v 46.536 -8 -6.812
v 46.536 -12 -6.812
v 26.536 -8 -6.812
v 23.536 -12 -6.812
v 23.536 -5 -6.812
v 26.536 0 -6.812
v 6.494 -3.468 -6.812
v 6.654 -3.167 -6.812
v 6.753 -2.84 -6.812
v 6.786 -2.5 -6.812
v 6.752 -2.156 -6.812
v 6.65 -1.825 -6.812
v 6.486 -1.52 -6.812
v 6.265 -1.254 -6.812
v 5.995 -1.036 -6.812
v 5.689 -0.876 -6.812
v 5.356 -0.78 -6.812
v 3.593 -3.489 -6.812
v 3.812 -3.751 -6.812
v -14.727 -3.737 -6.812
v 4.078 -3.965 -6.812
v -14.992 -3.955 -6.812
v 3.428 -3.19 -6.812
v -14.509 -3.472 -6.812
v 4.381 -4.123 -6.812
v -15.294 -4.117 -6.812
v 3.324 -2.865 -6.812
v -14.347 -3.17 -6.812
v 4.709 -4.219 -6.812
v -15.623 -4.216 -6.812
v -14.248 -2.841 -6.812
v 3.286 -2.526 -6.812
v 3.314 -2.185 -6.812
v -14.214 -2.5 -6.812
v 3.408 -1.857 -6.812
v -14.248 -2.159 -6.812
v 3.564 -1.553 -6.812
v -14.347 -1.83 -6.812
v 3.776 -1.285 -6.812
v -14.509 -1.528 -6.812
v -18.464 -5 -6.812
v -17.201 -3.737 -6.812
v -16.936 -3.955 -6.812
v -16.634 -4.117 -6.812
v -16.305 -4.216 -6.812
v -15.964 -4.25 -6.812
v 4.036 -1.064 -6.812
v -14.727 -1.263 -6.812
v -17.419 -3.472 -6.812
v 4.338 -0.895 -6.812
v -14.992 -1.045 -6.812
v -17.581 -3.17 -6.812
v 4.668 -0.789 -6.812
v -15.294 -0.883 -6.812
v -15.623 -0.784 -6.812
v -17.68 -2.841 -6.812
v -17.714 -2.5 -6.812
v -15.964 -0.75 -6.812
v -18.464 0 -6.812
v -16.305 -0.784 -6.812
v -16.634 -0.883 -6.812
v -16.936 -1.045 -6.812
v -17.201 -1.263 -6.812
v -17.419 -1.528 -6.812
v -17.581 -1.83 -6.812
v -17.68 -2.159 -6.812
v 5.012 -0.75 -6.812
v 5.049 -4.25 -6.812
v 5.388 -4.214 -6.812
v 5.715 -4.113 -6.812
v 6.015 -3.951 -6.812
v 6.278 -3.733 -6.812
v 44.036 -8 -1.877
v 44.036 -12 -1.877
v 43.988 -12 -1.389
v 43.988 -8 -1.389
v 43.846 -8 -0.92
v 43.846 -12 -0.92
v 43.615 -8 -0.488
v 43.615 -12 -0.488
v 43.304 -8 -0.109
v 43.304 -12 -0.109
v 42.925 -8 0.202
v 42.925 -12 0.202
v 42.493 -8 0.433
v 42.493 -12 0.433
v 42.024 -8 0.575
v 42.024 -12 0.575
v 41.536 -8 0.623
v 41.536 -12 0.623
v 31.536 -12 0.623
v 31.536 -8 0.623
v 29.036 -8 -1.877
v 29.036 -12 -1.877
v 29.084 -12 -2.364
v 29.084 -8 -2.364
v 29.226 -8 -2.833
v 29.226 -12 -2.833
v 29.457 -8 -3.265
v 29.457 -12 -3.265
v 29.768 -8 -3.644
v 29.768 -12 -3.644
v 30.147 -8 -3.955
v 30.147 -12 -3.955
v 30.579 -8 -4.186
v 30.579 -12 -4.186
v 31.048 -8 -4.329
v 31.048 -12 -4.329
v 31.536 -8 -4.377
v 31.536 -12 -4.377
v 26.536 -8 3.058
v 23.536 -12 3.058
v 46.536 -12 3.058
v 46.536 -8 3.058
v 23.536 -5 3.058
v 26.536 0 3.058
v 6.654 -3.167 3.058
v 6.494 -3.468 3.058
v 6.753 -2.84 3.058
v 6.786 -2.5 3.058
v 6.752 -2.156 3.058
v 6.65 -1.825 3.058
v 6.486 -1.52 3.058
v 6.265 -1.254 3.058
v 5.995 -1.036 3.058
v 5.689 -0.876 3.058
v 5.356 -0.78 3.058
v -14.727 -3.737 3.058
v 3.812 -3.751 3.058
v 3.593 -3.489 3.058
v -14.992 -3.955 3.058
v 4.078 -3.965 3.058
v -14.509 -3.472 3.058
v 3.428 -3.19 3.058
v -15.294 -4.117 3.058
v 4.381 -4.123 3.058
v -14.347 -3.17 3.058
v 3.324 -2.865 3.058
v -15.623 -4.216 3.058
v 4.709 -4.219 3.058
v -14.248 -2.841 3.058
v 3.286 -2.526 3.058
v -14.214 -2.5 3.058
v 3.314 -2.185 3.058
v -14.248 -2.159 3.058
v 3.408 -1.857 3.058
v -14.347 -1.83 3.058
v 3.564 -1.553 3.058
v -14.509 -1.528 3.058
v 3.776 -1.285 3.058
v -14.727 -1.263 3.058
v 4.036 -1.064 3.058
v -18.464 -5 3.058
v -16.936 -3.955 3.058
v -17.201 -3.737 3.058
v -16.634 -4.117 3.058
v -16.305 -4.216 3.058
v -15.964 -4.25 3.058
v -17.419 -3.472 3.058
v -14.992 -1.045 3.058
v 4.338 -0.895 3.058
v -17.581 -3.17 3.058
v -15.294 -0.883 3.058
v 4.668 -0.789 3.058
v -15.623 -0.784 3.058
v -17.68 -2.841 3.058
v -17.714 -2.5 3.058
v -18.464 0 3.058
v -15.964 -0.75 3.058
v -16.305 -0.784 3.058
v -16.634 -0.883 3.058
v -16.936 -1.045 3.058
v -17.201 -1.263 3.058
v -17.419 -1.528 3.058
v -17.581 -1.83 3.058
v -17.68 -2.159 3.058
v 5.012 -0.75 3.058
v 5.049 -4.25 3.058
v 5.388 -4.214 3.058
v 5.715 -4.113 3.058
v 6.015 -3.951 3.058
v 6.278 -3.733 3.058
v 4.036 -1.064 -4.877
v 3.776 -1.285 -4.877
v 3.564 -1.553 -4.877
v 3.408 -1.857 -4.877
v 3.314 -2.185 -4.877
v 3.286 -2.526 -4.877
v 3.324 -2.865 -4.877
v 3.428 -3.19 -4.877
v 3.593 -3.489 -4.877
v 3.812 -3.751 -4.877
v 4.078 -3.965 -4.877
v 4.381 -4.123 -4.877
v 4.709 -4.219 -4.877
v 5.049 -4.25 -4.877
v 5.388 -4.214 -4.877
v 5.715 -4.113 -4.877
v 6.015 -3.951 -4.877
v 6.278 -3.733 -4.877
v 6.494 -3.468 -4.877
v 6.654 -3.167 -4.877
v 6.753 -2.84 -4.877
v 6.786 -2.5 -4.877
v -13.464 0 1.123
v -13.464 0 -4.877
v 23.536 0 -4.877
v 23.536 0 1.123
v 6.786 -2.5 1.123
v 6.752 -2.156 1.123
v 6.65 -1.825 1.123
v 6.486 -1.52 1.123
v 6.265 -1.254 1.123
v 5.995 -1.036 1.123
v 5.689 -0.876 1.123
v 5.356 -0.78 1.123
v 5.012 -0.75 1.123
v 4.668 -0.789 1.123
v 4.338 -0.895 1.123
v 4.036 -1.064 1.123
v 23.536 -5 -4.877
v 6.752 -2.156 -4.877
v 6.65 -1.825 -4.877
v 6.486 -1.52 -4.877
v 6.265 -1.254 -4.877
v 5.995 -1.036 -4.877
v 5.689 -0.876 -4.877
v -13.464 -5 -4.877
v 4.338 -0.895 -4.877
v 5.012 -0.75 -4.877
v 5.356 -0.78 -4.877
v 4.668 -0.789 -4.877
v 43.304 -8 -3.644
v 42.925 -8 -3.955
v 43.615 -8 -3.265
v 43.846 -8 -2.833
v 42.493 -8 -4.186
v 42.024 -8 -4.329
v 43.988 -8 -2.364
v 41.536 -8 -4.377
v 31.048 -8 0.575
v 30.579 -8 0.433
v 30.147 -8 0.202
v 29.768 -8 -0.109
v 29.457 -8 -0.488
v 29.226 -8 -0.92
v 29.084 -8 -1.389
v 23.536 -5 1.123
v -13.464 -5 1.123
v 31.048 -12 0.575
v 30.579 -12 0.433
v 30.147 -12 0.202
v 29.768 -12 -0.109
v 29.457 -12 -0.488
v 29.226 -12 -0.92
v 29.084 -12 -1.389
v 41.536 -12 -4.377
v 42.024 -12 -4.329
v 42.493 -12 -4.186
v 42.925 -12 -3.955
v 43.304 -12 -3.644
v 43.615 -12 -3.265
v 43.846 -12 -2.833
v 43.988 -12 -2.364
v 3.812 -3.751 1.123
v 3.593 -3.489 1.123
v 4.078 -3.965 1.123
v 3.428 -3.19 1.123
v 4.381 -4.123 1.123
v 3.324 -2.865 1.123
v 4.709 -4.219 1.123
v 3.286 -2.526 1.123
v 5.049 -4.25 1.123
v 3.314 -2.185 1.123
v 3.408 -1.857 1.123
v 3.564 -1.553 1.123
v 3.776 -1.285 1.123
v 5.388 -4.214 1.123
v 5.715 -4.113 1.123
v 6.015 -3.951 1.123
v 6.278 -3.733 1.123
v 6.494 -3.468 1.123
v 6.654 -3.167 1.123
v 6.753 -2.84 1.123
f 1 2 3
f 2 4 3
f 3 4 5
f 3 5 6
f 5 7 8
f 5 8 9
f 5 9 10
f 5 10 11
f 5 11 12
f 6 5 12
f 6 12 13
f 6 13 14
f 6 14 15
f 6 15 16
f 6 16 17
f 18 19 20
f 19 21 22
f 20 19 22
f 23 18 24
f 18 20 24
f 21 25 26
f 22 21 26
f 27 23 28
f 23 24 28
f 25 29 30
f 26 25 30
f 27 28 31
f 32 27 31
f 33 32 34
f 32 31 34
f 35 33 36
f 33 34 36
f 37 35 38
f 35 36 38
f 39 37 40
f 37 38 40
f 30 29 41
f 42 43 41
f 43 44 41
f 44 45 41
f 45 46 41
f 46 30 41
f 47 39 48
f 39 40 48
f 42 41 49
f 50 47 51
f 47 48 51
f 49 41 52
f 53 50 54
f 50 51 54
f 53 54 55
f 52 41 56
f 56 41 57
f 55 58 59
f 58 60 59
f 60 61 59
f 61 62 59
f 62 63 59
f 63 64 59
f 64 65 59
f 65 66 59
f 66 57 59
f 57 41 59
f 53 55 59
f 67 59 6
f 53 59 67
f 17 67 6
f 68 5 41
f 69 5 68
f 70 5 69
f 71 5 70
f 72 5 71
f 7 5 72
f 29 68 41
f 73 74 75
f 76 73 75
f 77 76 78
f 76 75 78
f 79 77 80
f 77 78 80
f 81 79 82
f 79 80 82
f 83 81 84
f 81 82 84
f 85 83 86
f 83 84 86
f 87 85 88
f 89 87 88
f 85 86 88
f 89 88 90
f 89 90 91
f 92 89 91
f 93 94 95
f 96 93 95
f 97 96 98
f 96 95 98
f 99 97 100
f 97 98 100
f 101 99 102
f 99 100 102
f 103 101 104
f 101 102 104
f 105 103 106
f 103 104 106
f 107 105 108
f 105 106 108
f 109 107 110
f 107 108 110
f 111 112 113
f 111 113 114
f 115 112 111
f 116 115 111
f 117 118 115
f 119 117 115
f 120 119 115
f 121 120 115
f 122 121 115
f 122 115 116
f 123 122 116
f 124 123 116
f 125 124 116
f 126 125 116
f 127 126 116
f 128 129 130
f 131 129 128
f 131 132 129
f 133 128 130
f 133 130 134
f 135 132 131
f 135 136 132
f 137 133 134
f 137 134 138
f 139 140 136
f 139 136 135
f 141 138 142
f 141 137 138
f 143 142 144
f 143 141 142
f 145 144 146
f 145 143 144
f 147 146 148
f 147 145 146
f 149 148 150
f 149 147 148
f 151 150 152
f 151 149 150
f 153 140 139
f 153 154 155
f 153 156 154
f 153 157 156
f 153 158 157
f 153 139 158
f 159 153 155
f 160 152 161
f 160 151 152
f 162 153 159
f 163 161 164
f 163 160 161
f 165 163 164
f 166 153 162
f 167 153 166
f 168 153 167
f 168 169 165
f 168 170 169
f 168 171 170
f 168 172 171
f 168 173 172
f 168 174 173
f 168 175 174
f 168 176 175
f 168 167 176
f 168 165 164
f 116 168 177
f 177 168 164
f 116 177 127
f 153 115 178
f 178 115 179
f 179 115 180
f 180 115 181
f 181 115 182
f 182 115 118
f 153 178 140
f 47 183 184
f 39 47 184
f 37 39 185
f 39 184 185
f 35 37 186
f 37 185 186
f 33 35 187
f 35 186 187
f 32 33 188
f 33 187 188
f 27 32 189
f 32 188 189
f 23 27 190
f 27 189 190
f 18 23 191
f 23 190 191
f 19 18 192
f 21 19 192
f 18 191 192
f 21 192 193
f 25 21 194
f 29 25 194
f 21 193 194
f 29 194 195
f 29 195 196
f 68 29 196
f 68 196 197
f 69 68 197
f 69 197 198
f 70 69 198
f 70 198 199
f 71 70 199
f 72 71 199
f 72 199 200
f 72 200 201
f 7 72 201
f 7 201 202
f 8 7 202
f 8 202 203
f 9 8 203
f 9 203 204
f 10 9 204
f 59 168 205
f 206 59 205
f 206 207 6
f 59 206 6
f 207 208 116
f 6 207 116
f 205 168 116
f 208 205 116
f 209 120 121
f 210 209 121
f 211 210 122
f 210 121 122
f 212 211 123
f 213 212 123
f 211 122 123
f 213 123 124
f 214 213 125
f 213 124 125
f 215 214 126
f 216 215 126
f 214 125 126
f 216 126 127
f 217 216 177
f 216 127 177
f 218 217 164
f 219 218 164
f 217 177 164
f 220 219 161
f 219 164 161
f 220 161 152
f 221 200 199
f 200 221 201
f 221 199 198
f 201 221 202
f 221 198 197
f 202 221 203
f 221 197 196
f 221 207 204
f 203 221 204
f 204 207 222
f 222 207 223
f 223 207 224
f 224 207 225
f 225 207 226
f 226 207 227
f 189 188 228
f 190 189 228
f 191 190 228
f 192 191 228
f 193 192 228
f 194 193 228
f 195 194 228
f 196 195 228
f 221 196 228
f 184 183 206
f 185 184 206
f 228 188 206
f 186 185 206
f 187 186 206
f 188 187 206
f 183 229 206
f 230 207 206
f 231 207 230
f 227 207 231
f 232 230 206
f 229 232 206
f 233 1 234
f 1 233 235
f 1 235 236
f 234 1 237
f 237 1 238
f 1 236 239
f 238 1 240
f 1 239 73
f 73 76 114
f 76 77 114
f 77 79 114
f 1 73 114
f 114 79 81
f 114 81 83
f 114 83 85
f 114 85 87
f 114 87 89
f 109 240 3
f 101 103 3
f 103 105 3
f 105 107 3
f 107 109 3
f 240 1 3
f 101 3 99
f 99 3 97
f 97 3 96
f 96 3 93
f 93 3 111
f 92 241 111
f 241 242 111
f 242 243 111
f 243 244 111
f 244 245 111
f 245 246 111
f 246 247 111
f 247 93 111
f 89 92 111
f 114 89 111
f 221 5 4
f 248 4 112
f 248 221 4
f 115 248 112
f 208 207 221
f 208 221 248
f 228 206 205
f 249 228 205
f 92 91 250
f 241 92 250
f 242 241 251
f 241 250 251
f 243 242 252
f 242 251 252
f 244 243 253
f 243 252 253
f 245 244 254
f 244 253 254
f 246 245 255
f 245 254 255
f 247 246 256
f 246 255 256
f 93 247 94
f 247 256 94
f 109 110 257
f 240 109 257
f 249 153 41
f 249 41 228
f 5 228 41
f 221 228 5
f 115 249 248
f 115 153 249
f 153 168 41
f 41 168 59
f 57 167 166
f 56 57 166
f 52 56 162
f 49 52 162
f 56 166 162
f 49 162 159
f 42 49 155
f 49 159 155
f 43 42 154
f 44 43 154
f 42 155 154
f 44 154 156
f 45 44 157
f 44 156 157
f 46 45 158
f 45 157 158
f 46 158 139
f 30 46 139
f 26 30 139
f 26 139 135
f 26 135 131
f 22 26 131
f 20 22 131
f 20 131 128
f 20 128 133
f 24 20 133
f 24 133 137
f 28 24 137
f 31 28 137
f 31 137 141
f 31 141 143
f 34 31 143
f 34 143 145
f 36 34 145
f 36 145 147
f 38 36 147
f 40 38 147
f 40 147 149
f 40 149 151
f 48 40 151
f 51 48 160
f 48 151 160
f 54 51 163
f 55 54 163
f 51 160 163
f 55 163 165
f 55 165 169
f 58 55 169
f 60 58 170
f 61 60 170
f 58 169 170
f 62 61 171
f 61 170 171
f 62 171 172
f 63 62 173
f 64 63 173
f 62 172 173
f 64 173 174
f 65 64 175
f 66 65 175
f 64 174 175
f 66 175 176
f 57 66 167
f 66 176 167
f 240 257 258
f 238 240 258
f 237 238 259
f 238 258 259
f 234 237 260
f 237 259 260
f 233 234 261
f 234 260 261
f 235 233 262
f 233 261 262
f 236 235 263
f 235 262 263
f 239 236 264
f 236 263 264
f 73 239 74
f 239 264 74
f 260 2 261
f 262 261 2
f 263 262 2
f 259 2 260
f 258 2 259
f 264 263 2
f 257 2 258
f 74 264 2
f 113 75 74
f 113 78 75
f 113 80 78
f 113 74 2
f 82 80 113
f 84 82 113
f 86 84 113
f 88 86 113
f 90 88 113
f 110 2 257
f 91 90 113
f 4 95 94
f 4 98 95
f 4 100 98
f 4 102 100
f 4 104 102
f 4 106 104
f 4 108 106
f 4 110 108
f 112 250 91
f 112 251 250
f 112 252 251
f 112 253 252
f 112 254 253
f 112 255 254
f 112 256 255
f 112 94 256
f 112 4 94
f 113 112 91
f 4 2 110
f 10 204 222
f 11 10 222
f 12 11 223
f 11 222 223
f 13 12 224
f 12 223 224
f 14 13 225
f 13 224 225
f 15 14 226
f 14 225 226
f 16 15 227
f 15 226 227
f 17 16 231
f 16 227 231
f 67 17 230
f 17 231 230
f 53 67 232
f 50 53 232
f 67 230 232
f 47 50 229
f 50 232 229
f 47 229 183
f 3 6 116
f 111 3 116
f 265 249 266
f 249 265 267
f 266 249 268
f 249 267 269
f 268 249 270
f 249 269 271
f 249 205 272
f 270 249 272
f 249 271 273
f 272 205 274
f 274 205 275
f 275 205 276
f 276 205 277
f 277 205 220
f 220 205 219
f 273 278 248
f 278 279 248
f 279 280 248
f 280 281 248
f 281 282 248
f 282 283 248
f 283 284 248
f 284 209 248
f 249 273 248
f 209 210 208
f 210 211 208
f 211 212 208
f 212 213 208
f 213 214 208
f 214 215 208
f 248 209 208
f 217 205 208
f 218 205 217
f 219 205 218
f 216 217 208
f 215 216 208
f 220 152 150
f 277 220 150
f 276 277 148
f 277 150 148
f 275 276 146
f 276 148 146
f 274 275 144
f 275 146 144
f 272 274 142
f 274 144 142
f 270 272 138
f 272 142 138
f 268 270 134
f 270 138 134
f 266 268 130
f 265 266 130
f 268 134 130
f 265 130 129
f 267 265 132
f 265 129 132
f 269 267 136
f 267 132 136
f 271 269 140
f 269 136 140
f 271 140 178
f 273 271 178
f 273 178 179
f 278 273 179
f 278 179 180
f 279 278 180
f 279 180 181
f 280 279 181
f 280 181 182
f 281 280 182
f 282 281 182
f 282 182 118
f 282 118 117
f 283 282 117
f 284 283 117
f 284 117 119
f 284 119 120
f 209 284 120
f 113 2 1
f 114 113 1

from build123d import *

# Parameters (mm, degrees)
F0_W     = 3
F0_H     = 3
F1_DEPTH = 5
F3_DEPTH = 25
F4_W     = 3
F4_H     = 9.87
F5_DEPTH = 7
F6_W     = 4
F6_H     = 9.87
F7_DEPTH = 20
F9_DEPTH = 25


with BuildPart() as f1:
    # F0 (on Front) → F1 (new body)
    with BuildSketch(Plane.XZ):
        Polygon((-18.4640498906, -4.8765387449), (-18.4640498906, -6.8115387449), (26.5359501094, -6.8115387449), (26.5359501094, -4.8765387449), (23.5359501094, -4.8765387449), (-13.4640498906, -4.8765387449), align=None)
        Polygon((-18.4640498906, 3.0584612551), (-18.4640498906, -4.8765387449), (-13.4640498906, -4.8765387449), (-13.4640498906, 1.1234612551), (-1.7127114115, 1.1234612551), (23.5359501094, 1.1234612551), (26.5359501094, 1.1234612551), (26.5359501094, 3.0584612551), align=None)
        with Locations((25.0359501094, -3.3765387449)):
            Rectangle(F0_W, F0_H)
        with Locations((25.0359501094, -0.3765387449)):
            Rectangle(F0_W, F0_H)
    extrude(amount=F1_DEPTH)

    # F2 (on face) → F3 (cut)
    with BuildSketch(Plane.XY.offset(3.0584612551)):
        with BuildLine():
            ThreePointArc((-14.2140498906, -2.5), (-15.9640498906, -0.75), (-17.7140498906, -2.5))
            ThreePointArc((-17.7140498906, -2.5), (-15.9640498906, -4.25), (-14.2140498906, -2.5))
        make_face()
        with BuildLine():
            ThreePointArc((6.7859501094, -2.5), (5.8460426967, -0.9487907943), (4.0359501094, -1.0638593384))
            ThreePointArc((4.0359501094, -1.0638593384), (4.2258575221, -4.0512092057), (6.7859501094, -2.5))
        make_face()
    extrude(amount=-F3_DEPTH, mode=Mode.SUBTRACT)

    # F4 (on face) → F5 (join)
    with BuildSketch(Plane.XZ.offset(5)):
        with Locations((25.0359501094, -1.8765387449)):
            Rectangle(F4_W, F4_H)
    extrude(amount=F5_DEPTH)

    # F6 (on face) → F7 (join)
    with BuildSketch(Plane.YZ.offset(26.5359501094)):
        with Locations((-10, -1.8765387449)):
            Rectangle(F6_W, F6_H)
    extrude(amount=F7_DEPTH)

    # F8 (on face) → F9 (cut)
    with BuildSketch(Plane.XZ.offset(12)):
        with BuildLine():
            ThreePointArc((31.5359501094, 0.6234612551), (29.7681831564, -0.1087717919), (29.0359501094, -1.8765387449))
            Line((29.0359501094, -1.8765387449), (31.5359501094, -1.8765387449))
            Line((31.5359501094, -1.8765387449), (41.5359501094, -1.8765387449))
            Line((41.5359501094, -1.8765387449), (44.0359501094, -1.8765387449))
            ThreePointArc((44.0359501094, -1.8765387449), (43.3037170623, -0.1087717919), (41.5359501094, 0.6234612551))
            Line((41.5359501094, 0.6234612551), (31.5359501094, 0.6234612551))
        make_face()
        with BuildLine():
            Line((31.5359501094, -1.8765387449), (29.0359501094, -1.8765387449))
            ThreePointArc((29.0359501094, -1.8765387449), (29.7681831564, -3.6443056978), (31.5359501094, -4.3765387449))
            Line((31.5359501094, -4.3765387449), (41.5359501094, -4.3765387449))
            ThreePointArc((41.5359501094, -4.3765387449), (43.3037170623, -3.6443056978), (44.0359501094, -1.8765387449))
            Line((44.0359501094, -1.8765387449), (41.5359501094, -1.8765387449))
            Line((41.5359501094, -1.8765387449), (31.5359501094, -1.8765387449))
        make_face()
    extrude(amount=-F9_DEPTH, mode=Mode.SUBTRACT)


solid = f1.part
